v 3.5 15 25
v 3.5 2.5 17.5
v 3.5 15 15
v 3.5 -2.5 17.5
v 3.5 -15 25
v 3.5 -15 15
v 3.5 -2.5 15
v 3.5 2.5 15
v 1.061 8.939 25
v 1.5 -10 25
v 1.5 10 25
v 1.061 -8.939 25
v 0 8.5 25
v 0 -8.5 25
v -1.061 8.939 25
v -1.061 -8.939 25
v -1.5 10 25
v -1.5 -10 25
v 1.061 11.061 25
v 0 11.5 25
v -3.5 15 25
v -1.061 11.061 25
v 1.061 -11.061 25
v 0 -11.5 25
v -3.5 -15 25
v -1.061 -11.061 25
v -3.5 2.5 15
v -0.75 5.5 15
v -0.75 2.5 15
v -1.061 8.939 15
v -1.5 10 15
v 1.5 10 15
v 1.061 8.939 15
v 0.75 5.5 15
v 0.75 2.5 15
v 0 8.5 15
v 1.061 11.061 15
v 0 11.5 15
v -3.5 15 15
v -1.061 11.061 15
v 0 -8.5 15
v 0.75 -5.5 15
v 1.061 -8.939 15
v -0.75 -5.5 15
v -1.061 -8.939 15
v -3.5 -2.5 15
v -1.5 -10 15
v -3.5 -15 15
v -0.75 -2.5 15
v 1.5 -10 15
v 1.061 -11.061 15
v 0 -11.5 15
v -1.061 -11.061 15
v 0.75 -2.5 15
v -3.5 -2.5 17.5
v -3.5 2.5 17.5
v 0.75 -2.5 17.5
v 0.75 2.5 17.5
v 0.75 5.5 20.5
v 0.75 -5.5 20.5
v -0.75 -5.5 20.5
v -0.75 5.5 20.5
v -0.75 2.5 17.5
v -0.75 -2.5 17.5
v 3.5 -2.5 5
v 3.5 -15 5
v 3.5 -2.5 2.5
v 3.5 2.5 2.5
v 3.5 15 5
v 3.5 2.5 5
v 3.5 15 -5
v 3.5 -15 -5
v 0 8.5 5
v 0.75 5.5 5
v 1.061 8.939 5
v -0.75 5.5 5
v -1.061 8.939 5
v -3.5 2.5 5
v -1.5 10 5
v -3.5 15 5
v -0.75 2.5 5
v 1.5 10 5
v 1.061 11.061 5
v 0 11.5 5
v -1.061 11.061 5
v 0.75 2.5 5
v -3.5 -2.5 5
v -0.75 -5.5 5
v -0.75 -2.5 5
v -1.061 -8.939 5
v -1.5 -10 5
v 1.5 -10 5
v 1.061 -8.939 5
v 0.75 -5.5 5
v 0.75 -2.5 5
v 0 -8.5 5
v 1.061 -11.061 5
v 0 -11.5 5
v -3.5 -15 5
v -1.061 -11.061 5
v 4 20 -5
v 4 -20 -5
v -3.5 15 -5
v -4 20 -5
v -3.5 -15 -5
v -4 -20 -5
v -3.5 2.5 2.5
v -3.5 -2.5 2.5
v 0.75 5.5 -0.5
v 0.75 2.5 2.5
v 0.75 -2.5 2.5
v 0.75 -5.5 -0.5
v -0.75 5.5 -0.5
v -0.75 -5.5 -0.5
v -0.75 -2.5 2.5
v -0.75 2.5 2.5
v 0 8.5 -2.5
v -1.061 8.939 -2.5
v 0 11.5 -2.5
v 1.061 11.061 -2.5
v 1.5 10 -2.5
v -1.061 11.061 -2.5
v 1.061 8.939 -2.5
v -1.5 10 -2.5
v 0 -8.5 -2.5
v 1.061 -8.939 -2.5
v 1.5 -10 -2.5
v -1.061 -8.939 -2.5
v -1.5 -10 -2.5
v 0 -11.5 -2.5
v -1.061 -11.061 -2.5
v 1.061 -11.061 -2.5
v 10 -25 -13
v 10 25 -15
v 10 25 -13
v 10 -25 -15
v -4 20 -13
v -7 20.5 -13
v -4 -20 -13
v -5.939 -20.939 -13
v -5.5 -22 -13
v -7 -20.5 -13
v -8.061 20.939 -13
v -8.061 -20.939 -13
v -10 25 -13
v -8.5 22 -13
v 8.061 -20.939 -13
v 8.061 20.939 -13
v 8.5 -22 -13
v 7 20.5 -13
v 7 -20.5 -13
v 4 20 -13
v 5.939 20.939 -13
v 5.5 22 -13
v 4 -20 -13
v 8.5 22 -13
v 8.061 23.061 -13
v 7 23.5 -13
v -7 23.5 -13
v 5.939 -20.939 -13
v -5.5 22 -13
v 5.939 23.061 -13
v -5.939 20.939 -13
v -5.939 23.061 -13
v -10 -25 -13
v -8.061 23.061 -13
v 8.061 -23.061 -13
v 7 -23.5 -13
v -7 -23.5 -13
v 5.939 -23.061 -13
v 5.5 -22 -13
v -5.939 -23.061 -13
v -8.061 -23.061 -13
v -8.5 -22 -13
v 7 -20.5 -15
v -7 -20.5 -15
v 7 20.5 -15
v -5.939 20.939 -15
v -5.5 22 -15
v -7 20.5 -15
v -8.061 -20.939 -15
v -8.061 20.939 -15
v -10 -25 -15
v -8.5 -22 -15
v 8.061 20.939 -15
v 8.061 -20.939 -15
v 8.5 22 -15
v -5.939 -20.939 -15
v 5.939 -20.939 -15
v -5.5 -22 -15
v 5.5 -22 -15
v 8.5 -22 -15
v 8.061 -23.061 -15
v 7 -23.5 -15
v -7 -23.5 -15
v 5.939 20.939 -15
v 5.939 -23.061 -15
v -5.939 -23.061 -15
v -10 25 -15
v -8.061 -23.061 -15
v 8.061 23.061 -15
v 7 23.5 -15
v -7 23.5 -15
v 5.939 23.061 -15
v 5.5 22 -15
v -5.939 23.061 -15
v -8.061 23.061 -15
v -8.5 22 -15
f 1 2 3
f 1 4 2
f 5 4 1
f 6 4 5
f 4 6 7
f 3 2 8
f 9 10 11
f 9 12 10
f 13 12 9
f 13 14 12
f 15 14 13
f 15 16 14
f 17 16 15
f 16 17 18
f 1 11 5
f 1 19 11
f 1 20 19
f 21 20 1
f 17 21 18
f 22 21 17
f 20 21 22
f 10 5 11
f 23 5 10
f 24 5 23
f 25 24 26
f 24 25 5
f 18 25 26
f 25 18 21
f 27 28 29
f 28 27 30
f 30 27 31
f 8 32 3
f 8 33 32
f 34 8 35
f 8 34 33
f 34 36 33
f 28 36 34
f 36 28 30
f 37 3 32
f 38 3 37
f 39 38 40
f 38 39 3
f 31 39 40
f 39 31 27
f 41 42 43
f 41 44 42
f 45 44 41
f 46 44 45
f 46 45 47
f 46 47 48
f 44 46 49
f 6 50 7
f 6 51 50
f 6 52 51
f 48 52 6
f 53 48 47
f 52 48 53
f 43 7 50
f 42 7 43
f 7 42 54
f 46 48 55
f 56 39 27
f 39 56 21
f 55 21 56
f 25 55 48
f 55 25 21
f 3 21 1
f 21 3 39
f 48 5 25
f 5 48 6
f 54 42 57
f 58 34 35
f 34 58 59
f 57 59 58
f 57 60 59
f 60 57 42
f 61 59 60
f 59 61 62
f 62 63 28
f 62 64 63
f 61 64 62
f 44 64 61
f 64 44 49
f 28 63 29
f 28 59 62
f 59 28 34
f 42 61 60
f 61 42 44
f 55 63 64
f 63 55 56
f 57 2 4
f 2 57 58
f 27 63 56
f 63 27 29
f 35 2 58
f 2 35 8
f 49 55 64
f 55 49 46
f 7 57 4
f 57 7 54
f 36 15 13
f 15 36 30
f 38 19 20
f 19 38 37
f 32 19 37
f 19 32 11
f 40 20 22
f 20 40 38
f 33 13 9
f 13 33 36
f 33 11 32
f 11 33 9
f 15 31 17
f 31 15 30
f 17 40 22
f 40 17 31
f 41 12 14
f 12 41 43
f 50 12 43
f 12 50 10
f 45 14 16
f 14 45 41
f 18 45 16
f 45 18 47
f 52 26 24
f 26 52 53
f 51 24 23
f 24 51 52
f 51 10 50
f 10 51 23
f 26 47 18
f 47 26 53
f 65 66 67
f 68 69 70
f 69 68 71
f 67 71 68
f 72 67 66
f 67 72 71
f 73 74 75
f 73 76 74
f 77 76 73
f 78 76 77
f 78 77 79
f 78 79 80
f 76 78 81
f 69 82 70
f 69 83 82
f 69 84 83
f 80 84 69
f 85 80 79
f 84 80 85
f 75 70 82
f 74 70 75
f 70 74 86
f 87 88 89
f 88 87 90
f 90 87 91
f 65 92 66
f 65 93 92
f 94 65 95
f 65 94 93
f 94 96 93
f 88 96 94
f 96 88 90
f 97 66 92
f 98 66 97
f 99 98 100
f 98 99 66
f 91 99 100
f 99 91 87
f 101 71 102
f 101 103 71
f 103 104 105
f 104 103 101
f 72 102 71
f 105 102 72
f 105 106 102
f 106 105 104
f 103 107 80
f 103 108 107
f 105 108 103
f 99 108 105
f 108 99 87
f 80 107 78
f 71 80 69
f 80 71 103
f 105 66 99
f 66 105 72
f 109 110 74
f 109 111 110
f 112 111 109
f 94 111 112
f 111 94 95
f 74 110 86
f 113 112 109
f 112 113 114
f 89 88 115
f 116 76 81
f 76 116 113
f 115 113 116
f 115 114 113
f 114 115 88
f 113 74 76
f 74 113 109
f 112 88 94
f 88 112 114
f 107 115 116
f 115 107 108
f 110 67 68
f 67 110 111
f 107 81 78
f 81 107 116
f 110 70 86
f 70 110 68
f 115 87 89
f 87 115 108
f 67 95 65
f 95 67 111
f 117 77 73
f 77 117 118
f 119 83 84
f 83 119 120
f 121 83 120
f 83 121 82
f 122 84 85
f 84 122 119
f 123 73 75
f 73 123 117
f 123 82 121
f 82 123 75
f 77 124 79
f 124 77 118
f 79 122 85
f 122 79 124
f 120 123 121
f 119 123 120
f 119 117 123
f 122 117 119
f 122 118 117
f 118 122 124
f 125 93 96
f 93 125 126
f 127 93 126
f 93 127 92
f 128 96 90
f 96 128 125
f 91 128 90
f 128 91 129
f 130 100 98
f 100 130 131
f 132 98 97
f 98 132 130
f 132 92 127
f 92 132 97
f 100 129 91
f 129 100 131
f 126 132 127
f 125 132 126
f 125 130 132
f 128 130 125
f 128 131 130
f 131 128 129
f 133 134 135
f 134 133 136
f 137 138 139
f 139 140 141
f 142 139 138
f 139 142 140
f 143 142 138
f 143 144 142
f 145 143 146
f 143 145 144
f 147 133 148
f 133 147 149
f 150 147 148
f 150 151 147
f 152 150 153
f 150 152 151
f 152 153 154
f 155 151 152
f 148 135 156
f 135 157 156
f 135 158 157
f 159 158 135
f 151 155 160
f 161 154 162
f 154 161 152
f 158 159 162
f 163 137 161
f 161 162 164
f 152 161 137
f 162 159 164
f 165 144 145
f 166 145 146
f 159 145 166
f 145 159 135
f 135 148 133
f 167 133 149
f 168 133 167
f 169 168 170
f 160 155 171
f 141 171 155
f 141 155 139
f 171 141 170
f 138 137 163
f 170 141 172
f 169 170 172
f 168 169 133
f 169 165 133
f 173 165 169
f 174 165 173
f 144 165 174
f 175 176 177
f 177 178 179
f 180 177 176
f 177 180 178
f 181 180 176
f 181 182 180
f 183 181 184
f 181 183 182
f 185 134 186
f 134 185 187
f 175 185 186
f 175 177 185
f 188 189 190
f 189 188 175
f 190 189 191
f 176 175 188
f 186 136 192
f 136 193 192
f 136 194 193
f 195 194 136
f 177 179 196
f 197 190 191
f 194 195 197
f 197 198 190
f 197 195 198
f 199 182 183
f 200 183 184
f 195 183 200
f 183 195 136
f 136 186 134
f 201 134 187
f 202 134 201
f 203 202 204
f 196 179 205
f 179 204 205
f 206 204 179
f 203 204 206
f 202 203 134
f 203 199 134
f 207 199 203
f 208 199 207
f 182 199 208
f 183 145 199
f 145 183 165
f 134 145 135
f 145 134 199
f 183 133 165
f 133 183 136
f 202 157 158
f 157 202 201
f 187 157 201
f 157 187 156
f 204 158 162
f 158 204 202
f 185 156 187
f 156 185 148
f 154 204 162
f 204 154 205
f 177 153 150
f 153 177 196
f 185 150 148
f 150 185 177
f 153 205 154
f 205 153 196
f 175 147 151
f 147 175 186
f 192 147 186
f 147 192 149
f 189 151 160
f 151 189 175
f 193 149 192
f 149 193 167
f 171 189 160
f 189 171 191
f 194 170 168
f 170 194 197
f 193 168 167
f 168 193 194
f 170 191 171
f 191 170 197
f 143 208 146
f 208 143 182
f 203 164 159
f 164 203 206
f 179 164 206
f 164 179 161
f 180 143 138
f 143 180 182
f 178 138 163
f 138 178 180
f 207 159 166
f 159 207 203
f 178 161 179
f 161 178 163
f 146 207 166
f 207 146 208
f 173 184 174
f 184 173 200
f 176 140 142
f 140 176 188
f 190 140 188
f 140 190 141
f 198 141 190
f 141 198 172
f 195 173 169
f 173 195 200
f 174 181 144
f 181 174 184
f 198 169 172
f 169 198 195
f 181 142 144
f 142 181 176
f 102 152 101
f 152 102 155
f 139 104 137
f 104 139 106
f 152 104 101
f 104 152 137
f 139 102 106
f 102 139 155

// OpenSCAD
// file: ../filterMount_532nm_Pass_bottom.scad
use <write.scad>

module 532nmPassFilterBottom(){
	difference(){
		//lensHolderBottom
		translate([0,0,0]) color([0.8,1,.6]) cube(size=[7,30,10],center=true);	
		//lensHolderIndentation
		translate([0,0,5]) color([01,1,.6]) cube(size=[1.5,11,11],center=true);	
		//lensHole
		translate([0,0,5]) color([01,1,.6]) cube(size=[20,5,5],center=true);	
		//screwHoles
		translate([0,10,5]) color([1,0,0]) cylinder(h=15,r=1.5,$fn=8,center=true);
		translate([0,-10,5]) color([1,0,0]) cylinder(h=15,r=1.5,$fn=8,center=true);
	}
	//base
	translate([0,0,-9]) color([0.8,1,.6]) cube(size=[8,40,8],center=true);	
	difference(){
		translate([0,0,-14]) color([0.8,1,.6]) cube(size=[20,50,2],center=true);	
		//screwHoles
		translate([7,22,-14]) color([1,0,0]) cylinder(h=5,r=1.5,$fn=8,center=true);
		translate([7,-22,-14]) color([1,0,0]) cylinder(h=5,r=1.5,$fn=8,center=true);
		translate([-7,22,-14]) color([1,0,0]) cylinder(h=5,r=1.5,$fn=8,center=true);
		translate([-7,-22,-14]) color([1,0,0]) cylinder(h=5,r=1.5,$fn=8,center=true);
	}
	rotate([90,0,90]){
		translate([0,-9,4]){
//			write("532nmPassFilter",h=3,t=3,center=true);
		}
	}
}
translate([0,0,0]){
	532nmPassFilterBottom();
}
// file: ../filterMount_532nm_Pass_top.scad
module 532nmPassFilterTop(){
	difference(){
		//filterHolderTop
		translate([0,0,0]) color([0.8,1,.6]) cube(size=[7,30,10],center=true);	
		//filterHolderIndentation
		translate([0,0,-5]) color([01,1,.6]) cube(size=[1.5,11,11],center=true);	
		//filterHole
		translate([0,0,-5]) color([01,1,.6]) cube(size=[20,5,5],center=true);
		//screwHoles
		translate([0,10,0]) color([1,0,0]) cylinder(h=15,r=1.5,$fn=8,center=true);
		translate([0,-10,0]) color([1,0,0]) cylinder(h=15,r=1.5,$fn=8,center=true);
	}
}
translate([0,0,0]){
	532nmPassFilterTop();
}
// main file
use <../filterMount_532nm_Pass_top.scad>
use <../filterMount_532nm_Pass_bottom.scad>

translate([0,0,20]){
	532nmPassFilterTop();
}
translate([0,0,0]){
	532nmPassFilterBottom();
}
